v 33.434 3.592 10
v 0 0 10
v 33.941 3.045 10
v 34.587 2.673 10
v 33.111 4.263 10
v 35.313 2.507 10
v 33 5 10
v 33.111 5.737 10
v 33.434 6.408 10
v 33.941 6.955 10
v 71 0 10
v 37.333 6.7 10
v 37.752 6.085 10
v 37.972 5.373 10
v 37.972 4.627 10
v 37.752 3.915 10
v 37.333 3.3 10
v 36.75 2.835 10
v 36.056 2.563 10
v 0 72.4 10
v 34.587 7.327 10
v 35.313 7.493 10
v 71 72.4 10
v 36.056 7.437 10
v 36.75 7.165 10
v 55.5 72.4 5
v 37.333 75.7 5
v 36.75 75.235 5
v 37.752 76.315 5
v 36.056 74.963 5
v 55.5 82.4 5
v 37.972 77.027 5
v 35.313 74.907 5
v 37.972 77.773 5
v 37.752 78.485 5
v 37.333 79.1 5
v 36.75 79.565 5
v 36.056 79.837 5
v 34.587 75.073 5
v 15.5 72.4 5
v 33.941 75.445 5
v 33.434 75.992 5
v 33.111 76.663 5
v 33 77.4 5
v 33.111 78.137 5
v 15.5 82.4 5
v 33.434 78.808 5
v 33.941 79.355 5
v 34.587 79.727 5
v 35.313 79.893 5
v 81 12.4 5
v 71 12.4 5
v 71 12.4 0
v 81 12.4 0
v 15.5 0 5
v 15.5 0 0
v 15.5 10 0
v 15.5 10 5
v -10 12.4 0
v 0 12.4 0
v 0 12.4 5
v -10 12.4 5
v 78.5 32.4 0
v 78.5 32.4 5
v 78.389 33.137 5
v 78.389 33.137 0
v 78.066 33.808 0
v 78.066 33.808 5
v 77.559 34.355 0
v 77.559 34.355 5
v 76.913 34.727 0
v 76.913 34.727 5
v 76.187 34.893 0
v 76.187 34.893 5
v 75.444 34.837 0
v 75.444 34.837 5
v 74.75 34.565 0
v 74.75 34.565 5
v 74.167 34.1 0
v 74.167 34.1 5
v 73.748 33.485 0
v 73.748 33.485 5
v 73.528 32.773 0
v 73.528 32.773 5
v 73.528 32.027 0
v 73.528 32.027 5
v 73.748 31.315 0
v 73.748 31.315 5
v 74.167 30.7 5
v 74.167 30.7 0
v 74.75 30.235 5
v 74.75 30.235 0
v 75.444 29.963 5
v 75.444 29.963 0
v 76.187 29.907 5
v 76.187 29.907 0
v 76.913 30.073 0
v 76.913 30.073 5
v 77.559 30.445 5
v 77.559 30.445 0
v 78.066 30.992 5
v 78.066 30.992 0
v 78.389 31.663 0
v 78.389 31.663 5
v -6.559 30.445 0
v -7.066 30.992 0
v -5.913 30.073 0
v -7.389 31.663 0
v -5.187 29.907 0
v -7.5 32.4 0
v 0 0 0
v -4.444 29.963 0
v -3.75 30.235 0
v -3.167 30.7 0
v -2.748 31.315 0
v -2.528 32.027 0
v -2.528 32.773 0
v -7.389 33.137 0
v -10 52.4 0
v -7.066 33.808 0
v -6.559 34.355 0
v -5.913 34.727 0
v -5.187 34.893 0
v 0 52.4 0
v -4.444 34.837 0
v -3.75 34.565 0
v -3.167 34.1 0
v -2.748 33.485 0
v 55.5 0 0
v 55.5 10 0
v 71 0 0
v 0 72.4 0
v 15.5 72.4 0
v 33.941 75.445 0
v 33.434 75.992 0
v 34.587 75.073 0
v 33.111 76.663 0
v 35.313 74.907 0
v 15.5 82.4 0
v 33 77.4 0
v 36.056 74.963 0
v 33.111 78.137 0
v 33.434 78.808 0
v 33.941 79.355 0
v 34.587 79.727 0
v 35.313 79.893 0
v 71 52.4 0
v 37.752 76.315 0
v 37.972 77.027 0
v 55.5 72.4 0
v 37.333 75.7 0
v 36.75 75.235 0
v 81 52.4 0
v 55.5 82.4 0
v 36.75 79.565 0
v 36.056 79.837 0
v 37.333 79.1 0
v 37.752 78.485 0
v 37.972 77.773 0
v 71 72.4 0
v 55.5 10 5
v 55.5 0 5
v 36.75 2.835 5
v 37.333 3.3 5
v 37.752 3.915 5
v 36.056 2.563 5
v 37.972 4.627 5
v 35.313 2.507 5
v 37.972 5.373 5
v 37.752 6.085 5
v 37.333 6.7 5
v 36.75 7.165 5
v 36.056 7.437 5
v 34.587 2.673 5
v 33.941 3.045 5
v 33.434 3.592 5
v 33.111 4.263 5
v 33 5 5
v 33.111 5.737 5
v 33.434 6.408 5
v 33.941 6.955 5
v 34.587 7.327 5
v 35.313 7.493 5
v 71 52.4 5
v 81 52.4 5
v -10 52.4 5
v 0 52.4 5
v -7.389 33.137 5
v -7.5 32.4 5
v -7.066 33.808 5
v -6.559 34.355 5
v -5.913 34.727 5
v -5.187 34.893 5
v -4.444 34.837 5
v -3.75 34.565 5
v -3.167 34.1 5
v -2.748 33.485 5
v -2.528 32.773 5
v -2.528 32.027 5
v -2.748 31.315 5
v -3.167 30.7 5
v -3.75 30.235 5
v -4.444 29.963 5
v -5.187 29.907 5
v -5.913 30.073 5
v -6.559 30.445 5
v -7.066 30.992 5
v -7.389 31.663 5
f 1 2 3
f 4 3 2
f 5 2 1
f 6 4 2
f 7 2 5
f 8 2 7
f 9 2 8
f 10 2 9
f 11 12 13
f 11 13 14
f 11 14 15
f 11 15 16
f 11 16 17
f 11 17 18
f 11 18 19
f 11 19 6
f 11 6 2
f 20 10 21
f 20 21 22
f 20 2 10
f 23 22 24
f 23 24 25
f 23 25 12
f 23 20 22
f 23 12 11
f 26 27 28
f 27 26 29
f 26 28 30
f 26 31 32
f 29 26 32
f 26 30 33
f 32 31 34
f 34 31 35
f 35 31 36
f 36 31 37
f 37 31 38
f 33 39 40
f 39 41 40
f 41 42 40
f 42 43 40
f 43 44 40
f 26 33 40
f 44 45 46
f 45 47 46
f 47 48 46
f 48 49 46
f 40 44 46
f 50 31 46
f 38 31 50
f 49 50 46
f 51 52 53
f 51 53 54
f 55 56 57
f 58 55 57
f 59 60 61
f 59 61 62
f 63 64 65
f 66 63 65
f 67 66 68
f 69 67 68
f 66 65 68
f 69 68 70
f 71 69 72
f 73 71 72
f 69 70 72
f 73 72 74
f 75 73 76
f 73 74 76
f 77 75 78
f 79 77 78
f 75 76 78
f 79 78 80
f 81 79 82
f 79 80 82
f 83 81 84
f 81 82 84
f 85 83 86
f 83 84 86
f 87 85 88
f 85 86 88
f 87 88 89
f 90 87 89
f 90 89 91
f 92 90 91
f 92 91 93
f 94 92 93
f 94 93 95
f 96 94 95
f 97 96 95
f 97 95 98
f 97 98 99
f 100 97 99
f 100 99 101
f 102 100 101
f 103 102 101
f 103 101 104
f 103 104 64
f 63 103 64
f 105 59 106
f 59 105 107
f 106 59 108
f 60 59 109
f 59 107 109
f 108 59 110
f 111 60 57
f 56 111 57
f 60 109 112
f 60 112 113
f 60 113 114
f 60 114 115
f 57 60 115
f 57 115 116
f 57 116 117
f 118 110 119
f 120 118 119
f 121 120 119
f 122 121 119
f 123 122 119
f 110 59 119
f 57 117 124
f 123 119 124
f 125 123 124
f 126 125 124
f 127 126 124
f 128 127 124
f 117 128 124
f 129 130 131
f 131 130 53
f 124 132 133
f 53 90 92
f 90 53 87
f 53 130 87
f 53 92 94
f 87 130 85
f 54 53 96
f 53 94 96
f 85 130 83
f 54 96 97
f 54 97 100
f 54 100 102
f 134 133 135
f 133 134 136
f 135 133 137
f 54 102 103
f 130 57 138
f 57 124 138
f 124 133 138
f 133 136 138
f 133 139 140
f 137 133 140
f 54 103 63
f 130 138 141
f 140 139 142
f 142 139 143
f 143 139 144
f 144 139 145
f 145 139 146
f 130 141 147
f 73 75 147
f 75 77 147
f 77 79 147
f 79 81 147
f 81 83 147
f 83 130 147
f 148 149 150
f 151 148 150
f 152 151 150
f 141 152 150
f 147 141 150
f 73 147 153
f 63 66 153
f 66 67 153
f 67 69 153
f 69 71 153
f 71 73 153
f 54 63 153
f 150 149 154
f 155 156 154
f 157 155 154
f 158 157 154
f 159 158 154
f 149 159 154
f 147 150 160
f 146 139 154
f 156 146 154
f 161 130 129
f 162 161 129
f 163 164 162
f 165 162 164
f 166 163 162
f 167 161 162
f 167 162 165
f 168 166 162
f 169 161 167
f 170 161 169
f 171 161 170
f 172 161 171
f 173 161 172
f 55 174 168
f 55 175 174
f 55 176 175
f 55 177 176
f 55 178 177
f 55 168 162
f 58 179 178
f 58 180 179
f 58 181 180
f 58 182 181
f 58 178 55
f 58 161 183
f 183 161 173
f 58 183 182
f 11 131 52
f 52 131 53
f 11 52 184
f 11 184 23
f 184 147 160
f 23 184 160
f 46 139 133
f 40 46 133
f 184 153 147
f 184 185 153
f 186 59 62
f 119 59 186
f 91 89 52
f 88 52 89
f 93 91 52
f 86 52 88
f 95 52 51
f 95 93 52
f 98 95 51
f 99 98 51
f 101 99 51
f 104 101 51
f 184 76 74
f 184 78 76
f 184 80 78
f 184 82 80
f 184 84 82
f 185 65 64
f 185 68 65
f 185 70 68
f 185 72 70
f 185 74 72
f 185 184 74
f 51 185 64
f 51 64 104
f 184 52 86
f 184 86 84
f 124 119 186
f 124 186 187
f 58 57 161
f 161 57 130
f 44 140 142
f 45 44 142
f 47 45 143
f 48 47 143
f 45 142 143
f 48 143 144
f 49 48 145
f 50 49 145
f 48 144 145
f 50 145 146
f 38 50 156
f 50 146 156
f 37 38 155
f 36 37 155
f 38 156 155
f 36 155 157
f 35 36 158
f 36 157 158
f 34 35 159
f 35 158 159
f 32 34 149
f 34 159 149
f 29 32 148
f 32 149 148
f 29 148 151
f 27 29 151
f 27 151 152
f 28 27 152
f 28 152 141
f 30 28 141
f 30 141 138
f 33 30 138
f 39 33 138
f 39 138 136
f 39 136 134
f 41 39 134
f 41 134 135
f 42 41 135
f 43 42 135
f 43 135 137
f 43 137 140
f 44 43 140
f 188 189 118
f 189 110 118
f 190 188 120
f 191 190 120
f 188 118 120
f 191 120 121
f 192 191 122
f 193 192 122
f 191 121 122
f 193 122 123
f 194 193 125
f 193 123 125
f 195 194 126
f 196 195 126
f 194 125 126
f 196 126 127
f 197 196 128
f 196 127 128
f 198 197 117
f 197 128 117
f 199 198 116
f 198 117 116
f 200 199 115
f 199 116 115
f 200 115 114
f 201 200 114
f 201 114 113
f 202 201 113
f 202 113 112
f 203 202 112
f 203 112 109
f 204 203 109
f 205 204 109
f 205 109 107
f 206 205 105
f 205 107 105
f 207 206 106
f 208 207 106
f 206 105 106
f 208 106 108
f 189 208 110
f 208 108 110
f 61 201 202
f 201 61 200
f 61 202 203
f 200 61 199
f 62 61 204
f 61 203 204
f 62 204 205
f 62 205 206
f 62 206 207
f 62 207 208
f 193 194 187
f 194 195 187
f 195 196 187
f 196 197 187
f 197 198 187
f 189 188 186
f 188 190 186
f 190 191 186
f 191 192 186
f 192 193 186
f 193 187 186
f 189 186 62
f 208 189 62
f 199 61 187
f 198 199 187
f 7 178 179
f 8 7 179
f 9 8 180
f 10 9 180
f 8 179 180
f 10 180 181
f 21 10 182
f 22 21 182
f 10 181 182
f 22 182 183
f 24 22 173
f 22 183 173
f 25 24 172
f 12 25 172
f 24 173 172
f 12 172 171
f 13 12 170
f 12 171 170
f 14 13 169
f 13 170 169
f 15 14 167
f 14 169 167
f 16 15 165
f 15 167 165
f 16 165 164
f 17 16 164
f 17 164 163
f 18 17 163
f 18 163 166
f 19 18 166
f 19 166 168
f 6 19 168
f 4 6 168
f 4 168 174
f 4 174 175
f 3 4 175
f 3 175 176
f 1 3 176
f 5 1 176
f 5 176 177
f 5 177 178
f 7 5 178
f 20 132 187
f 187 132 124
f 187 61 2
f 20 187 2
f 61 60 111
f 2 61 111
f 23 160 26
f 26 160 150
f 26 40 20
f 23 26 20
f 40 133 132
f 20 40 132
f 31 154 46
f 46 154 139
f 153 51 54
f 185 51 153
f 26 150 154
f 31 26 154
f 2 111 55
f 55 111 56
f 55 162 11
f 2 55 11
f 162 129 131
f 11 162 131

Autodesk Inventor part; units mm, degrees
ref_plane "YZ Plane" through (0, 0, 0) normal (1, 0, 0) x (0, 1, 0)
ref_plane "XZ Plane" through (0, 0, 0) normal (0, 1, 0) x (-1, 0, 0)
ref_plane "XY Plane" through (0, 0, 0) normal (0, 0, 1) x (1, 0, 0)
sketch "Sketch1" plane through (0, 0, 0) normal (0, 0, 1) x (1, 0, 0)
  line L0 (0, 0) -> (71, 0)
  line L1 (71, 0) -> (71, 72.4)
  line L2 (71, 72.4) -> (0, 72.4)
  line L3 (0, 72.4) -> (0, 0)
  dimension "d0" = 71
  dimension "d1" = 72.4
extrude "Extrusion1" add sketch "Sketch1" along normal blind 10
sketch "Sketch2" plane through (0, 0, 10) normal (0, 0, 1) x (1, 0, 0)
  line L0 (71, 0) -> (71, 72.4) projected
  line L1 (71, 12.4) -> (81, 12.4)
  line L2 (81, 12.4) -> (81, 52.4)
  line L3 (81, 52.4) -> (71, 52.4)
  line L4 (71, 52.4) -> (71, 12.4)
  line L5 (71, 72.4) -> (0, 72.4) projected
  circle A0 centre (76, 32.4) radius 2.5
  line L6 (0, 0) -> (71, 0) projected
  point P0 (81, 32.4)
  point P1 (76, 52.4)
  dimension "d4" = 10
  dimension "d5" = 40
  dimension "d7" = 5
  dimension "d53" = 20
extrude "Extrusion2" add sketch "Sketch2" against normal blind 10
sketch "Sketch3" plane through (0, 0, 10) normal (0, 0, 1) x (1, 0, 0)
  line L0 (71, 52.4) -> (81, 52.4) projected
  line L1 (71, 12.4) -> (81, 12.4) projected
  line L2 (81, 52.4) -> (71, 52.4)
  line L3 (71, 52.4) -> (71, 12.4)
  line L4 (71, 12.4) -> (81, 12.4)
  line L5 (81, 12.4) -> (81, 52.4)
  point P0 (0, 0)
extrude "Extrusion3" cut sketch "Sketch3" against normal blind 5
sketch "Sketch8" plane through (0, 0, 0) normal (0, 0, -1) x (-1, 0, 0)
  line L0 (-15.5, 10) -> (-55.5, 10)
  line L1 (-55.5, 10) -> (-55.5, 0)
  line L2 (-55.5, 0) -> (-15.5, 0)
  line L3 (-15.5, 0) -> (-15.5, 10)
  line L4 (0, 0) -> (-71, 0) projected
  line L5 (-71, 0) -> (-71, 12.4) projected
  line L6 (-71, 72.4) -> (0, 72.4) projected
  point P0 (-35.5, 0)
  point P1 (-35.5, 0)
  point P2 (-35.5, 10)
  point P3 (-35.5, 72.4)
  dimension "d32" = 40
  dimension "d33" = 10
extrude "Extrusion8" cut sketch "Sketch8" against normal blind 5
sketch "Sketch9" plane through (0, 0, 5) normal (0, 0, -1) x (-1, 0, 0)
  line L0 (-55.5, 0) -> (-55.5, 10) construction
  line L1 (-15.5, 10) -> (-15.5, 0) construction
  circle A0 centre (-35.5, 5) radius 2.5
  line L2 (-55.5, 10) -> (-15.5, 10) projected
  line L3 (-15.5, 0) -> (-55.5, 0) projected
  point P0 (0, 0)
  point P1 (-35.5, 0)
  point P2 (-15.5, 5)
  dimension "d37" = 5
extrude "Extrusion9" cut sketch "Sketch9" against normal through all
sketch "Sketch10" plane through (0, 0, 0) normal (0, 0, -1) x (-1, 0, 0)
  line L0 (0, 72.4) -> (0, 0) projected
  line L1 (0, 12.4) -> (10, 12.4)
  line L2 (10, 12.4) -> (10, 52.4)
  line L3 (10, 52.4) -> (0, 52.4)
  line L4 (0, 52.4) -> (0, 12.4)
  circle A0 centre (5, 32.4) radius 2.5
  point P0 (-81, 12.4)
  point P1 (10, 32.4)
  point P2 (5, 12.4)
  dimension "d40" = 10
  dimension "d41" = 40
  dimension "d42" = 5
extrude "Extrusion10" add sketch "Sketch10" against normal blind 5
sketch "Sketch11" plane through (0, 0, 0) normal (0, 0, -1) x (-1, 0, 0)
  line L0 (-71, 72.4) -> (0, 72.4) projected
  line L1 (-15.5, 72.4) -> (-55.5, 72.4)
  line L2 (-55.5, 72.4) -> (-55.5, 82.4)
  line L3 (-55.5, 82.4) -> (-15.5, 82.4)
  line L4 (-15.5, 82.4) -> (-15.5, 72.4)
  circle A0 centre (-35.5, 77.4) radius 2.5
  point P0 (0, 0)
  point P1 (-35.5, 82.4)
  point P2 (-35.5, 72.4)
  point P3 (-15.5, 77.4)
  dimension "d46" = 40
  dimension "d47" = 10
  dimension "d48" = 5
extrude "Extrusion11" add sketch "Sketch11" against normal blind 5
properties part number "SP002" material "ABS Plastic"
